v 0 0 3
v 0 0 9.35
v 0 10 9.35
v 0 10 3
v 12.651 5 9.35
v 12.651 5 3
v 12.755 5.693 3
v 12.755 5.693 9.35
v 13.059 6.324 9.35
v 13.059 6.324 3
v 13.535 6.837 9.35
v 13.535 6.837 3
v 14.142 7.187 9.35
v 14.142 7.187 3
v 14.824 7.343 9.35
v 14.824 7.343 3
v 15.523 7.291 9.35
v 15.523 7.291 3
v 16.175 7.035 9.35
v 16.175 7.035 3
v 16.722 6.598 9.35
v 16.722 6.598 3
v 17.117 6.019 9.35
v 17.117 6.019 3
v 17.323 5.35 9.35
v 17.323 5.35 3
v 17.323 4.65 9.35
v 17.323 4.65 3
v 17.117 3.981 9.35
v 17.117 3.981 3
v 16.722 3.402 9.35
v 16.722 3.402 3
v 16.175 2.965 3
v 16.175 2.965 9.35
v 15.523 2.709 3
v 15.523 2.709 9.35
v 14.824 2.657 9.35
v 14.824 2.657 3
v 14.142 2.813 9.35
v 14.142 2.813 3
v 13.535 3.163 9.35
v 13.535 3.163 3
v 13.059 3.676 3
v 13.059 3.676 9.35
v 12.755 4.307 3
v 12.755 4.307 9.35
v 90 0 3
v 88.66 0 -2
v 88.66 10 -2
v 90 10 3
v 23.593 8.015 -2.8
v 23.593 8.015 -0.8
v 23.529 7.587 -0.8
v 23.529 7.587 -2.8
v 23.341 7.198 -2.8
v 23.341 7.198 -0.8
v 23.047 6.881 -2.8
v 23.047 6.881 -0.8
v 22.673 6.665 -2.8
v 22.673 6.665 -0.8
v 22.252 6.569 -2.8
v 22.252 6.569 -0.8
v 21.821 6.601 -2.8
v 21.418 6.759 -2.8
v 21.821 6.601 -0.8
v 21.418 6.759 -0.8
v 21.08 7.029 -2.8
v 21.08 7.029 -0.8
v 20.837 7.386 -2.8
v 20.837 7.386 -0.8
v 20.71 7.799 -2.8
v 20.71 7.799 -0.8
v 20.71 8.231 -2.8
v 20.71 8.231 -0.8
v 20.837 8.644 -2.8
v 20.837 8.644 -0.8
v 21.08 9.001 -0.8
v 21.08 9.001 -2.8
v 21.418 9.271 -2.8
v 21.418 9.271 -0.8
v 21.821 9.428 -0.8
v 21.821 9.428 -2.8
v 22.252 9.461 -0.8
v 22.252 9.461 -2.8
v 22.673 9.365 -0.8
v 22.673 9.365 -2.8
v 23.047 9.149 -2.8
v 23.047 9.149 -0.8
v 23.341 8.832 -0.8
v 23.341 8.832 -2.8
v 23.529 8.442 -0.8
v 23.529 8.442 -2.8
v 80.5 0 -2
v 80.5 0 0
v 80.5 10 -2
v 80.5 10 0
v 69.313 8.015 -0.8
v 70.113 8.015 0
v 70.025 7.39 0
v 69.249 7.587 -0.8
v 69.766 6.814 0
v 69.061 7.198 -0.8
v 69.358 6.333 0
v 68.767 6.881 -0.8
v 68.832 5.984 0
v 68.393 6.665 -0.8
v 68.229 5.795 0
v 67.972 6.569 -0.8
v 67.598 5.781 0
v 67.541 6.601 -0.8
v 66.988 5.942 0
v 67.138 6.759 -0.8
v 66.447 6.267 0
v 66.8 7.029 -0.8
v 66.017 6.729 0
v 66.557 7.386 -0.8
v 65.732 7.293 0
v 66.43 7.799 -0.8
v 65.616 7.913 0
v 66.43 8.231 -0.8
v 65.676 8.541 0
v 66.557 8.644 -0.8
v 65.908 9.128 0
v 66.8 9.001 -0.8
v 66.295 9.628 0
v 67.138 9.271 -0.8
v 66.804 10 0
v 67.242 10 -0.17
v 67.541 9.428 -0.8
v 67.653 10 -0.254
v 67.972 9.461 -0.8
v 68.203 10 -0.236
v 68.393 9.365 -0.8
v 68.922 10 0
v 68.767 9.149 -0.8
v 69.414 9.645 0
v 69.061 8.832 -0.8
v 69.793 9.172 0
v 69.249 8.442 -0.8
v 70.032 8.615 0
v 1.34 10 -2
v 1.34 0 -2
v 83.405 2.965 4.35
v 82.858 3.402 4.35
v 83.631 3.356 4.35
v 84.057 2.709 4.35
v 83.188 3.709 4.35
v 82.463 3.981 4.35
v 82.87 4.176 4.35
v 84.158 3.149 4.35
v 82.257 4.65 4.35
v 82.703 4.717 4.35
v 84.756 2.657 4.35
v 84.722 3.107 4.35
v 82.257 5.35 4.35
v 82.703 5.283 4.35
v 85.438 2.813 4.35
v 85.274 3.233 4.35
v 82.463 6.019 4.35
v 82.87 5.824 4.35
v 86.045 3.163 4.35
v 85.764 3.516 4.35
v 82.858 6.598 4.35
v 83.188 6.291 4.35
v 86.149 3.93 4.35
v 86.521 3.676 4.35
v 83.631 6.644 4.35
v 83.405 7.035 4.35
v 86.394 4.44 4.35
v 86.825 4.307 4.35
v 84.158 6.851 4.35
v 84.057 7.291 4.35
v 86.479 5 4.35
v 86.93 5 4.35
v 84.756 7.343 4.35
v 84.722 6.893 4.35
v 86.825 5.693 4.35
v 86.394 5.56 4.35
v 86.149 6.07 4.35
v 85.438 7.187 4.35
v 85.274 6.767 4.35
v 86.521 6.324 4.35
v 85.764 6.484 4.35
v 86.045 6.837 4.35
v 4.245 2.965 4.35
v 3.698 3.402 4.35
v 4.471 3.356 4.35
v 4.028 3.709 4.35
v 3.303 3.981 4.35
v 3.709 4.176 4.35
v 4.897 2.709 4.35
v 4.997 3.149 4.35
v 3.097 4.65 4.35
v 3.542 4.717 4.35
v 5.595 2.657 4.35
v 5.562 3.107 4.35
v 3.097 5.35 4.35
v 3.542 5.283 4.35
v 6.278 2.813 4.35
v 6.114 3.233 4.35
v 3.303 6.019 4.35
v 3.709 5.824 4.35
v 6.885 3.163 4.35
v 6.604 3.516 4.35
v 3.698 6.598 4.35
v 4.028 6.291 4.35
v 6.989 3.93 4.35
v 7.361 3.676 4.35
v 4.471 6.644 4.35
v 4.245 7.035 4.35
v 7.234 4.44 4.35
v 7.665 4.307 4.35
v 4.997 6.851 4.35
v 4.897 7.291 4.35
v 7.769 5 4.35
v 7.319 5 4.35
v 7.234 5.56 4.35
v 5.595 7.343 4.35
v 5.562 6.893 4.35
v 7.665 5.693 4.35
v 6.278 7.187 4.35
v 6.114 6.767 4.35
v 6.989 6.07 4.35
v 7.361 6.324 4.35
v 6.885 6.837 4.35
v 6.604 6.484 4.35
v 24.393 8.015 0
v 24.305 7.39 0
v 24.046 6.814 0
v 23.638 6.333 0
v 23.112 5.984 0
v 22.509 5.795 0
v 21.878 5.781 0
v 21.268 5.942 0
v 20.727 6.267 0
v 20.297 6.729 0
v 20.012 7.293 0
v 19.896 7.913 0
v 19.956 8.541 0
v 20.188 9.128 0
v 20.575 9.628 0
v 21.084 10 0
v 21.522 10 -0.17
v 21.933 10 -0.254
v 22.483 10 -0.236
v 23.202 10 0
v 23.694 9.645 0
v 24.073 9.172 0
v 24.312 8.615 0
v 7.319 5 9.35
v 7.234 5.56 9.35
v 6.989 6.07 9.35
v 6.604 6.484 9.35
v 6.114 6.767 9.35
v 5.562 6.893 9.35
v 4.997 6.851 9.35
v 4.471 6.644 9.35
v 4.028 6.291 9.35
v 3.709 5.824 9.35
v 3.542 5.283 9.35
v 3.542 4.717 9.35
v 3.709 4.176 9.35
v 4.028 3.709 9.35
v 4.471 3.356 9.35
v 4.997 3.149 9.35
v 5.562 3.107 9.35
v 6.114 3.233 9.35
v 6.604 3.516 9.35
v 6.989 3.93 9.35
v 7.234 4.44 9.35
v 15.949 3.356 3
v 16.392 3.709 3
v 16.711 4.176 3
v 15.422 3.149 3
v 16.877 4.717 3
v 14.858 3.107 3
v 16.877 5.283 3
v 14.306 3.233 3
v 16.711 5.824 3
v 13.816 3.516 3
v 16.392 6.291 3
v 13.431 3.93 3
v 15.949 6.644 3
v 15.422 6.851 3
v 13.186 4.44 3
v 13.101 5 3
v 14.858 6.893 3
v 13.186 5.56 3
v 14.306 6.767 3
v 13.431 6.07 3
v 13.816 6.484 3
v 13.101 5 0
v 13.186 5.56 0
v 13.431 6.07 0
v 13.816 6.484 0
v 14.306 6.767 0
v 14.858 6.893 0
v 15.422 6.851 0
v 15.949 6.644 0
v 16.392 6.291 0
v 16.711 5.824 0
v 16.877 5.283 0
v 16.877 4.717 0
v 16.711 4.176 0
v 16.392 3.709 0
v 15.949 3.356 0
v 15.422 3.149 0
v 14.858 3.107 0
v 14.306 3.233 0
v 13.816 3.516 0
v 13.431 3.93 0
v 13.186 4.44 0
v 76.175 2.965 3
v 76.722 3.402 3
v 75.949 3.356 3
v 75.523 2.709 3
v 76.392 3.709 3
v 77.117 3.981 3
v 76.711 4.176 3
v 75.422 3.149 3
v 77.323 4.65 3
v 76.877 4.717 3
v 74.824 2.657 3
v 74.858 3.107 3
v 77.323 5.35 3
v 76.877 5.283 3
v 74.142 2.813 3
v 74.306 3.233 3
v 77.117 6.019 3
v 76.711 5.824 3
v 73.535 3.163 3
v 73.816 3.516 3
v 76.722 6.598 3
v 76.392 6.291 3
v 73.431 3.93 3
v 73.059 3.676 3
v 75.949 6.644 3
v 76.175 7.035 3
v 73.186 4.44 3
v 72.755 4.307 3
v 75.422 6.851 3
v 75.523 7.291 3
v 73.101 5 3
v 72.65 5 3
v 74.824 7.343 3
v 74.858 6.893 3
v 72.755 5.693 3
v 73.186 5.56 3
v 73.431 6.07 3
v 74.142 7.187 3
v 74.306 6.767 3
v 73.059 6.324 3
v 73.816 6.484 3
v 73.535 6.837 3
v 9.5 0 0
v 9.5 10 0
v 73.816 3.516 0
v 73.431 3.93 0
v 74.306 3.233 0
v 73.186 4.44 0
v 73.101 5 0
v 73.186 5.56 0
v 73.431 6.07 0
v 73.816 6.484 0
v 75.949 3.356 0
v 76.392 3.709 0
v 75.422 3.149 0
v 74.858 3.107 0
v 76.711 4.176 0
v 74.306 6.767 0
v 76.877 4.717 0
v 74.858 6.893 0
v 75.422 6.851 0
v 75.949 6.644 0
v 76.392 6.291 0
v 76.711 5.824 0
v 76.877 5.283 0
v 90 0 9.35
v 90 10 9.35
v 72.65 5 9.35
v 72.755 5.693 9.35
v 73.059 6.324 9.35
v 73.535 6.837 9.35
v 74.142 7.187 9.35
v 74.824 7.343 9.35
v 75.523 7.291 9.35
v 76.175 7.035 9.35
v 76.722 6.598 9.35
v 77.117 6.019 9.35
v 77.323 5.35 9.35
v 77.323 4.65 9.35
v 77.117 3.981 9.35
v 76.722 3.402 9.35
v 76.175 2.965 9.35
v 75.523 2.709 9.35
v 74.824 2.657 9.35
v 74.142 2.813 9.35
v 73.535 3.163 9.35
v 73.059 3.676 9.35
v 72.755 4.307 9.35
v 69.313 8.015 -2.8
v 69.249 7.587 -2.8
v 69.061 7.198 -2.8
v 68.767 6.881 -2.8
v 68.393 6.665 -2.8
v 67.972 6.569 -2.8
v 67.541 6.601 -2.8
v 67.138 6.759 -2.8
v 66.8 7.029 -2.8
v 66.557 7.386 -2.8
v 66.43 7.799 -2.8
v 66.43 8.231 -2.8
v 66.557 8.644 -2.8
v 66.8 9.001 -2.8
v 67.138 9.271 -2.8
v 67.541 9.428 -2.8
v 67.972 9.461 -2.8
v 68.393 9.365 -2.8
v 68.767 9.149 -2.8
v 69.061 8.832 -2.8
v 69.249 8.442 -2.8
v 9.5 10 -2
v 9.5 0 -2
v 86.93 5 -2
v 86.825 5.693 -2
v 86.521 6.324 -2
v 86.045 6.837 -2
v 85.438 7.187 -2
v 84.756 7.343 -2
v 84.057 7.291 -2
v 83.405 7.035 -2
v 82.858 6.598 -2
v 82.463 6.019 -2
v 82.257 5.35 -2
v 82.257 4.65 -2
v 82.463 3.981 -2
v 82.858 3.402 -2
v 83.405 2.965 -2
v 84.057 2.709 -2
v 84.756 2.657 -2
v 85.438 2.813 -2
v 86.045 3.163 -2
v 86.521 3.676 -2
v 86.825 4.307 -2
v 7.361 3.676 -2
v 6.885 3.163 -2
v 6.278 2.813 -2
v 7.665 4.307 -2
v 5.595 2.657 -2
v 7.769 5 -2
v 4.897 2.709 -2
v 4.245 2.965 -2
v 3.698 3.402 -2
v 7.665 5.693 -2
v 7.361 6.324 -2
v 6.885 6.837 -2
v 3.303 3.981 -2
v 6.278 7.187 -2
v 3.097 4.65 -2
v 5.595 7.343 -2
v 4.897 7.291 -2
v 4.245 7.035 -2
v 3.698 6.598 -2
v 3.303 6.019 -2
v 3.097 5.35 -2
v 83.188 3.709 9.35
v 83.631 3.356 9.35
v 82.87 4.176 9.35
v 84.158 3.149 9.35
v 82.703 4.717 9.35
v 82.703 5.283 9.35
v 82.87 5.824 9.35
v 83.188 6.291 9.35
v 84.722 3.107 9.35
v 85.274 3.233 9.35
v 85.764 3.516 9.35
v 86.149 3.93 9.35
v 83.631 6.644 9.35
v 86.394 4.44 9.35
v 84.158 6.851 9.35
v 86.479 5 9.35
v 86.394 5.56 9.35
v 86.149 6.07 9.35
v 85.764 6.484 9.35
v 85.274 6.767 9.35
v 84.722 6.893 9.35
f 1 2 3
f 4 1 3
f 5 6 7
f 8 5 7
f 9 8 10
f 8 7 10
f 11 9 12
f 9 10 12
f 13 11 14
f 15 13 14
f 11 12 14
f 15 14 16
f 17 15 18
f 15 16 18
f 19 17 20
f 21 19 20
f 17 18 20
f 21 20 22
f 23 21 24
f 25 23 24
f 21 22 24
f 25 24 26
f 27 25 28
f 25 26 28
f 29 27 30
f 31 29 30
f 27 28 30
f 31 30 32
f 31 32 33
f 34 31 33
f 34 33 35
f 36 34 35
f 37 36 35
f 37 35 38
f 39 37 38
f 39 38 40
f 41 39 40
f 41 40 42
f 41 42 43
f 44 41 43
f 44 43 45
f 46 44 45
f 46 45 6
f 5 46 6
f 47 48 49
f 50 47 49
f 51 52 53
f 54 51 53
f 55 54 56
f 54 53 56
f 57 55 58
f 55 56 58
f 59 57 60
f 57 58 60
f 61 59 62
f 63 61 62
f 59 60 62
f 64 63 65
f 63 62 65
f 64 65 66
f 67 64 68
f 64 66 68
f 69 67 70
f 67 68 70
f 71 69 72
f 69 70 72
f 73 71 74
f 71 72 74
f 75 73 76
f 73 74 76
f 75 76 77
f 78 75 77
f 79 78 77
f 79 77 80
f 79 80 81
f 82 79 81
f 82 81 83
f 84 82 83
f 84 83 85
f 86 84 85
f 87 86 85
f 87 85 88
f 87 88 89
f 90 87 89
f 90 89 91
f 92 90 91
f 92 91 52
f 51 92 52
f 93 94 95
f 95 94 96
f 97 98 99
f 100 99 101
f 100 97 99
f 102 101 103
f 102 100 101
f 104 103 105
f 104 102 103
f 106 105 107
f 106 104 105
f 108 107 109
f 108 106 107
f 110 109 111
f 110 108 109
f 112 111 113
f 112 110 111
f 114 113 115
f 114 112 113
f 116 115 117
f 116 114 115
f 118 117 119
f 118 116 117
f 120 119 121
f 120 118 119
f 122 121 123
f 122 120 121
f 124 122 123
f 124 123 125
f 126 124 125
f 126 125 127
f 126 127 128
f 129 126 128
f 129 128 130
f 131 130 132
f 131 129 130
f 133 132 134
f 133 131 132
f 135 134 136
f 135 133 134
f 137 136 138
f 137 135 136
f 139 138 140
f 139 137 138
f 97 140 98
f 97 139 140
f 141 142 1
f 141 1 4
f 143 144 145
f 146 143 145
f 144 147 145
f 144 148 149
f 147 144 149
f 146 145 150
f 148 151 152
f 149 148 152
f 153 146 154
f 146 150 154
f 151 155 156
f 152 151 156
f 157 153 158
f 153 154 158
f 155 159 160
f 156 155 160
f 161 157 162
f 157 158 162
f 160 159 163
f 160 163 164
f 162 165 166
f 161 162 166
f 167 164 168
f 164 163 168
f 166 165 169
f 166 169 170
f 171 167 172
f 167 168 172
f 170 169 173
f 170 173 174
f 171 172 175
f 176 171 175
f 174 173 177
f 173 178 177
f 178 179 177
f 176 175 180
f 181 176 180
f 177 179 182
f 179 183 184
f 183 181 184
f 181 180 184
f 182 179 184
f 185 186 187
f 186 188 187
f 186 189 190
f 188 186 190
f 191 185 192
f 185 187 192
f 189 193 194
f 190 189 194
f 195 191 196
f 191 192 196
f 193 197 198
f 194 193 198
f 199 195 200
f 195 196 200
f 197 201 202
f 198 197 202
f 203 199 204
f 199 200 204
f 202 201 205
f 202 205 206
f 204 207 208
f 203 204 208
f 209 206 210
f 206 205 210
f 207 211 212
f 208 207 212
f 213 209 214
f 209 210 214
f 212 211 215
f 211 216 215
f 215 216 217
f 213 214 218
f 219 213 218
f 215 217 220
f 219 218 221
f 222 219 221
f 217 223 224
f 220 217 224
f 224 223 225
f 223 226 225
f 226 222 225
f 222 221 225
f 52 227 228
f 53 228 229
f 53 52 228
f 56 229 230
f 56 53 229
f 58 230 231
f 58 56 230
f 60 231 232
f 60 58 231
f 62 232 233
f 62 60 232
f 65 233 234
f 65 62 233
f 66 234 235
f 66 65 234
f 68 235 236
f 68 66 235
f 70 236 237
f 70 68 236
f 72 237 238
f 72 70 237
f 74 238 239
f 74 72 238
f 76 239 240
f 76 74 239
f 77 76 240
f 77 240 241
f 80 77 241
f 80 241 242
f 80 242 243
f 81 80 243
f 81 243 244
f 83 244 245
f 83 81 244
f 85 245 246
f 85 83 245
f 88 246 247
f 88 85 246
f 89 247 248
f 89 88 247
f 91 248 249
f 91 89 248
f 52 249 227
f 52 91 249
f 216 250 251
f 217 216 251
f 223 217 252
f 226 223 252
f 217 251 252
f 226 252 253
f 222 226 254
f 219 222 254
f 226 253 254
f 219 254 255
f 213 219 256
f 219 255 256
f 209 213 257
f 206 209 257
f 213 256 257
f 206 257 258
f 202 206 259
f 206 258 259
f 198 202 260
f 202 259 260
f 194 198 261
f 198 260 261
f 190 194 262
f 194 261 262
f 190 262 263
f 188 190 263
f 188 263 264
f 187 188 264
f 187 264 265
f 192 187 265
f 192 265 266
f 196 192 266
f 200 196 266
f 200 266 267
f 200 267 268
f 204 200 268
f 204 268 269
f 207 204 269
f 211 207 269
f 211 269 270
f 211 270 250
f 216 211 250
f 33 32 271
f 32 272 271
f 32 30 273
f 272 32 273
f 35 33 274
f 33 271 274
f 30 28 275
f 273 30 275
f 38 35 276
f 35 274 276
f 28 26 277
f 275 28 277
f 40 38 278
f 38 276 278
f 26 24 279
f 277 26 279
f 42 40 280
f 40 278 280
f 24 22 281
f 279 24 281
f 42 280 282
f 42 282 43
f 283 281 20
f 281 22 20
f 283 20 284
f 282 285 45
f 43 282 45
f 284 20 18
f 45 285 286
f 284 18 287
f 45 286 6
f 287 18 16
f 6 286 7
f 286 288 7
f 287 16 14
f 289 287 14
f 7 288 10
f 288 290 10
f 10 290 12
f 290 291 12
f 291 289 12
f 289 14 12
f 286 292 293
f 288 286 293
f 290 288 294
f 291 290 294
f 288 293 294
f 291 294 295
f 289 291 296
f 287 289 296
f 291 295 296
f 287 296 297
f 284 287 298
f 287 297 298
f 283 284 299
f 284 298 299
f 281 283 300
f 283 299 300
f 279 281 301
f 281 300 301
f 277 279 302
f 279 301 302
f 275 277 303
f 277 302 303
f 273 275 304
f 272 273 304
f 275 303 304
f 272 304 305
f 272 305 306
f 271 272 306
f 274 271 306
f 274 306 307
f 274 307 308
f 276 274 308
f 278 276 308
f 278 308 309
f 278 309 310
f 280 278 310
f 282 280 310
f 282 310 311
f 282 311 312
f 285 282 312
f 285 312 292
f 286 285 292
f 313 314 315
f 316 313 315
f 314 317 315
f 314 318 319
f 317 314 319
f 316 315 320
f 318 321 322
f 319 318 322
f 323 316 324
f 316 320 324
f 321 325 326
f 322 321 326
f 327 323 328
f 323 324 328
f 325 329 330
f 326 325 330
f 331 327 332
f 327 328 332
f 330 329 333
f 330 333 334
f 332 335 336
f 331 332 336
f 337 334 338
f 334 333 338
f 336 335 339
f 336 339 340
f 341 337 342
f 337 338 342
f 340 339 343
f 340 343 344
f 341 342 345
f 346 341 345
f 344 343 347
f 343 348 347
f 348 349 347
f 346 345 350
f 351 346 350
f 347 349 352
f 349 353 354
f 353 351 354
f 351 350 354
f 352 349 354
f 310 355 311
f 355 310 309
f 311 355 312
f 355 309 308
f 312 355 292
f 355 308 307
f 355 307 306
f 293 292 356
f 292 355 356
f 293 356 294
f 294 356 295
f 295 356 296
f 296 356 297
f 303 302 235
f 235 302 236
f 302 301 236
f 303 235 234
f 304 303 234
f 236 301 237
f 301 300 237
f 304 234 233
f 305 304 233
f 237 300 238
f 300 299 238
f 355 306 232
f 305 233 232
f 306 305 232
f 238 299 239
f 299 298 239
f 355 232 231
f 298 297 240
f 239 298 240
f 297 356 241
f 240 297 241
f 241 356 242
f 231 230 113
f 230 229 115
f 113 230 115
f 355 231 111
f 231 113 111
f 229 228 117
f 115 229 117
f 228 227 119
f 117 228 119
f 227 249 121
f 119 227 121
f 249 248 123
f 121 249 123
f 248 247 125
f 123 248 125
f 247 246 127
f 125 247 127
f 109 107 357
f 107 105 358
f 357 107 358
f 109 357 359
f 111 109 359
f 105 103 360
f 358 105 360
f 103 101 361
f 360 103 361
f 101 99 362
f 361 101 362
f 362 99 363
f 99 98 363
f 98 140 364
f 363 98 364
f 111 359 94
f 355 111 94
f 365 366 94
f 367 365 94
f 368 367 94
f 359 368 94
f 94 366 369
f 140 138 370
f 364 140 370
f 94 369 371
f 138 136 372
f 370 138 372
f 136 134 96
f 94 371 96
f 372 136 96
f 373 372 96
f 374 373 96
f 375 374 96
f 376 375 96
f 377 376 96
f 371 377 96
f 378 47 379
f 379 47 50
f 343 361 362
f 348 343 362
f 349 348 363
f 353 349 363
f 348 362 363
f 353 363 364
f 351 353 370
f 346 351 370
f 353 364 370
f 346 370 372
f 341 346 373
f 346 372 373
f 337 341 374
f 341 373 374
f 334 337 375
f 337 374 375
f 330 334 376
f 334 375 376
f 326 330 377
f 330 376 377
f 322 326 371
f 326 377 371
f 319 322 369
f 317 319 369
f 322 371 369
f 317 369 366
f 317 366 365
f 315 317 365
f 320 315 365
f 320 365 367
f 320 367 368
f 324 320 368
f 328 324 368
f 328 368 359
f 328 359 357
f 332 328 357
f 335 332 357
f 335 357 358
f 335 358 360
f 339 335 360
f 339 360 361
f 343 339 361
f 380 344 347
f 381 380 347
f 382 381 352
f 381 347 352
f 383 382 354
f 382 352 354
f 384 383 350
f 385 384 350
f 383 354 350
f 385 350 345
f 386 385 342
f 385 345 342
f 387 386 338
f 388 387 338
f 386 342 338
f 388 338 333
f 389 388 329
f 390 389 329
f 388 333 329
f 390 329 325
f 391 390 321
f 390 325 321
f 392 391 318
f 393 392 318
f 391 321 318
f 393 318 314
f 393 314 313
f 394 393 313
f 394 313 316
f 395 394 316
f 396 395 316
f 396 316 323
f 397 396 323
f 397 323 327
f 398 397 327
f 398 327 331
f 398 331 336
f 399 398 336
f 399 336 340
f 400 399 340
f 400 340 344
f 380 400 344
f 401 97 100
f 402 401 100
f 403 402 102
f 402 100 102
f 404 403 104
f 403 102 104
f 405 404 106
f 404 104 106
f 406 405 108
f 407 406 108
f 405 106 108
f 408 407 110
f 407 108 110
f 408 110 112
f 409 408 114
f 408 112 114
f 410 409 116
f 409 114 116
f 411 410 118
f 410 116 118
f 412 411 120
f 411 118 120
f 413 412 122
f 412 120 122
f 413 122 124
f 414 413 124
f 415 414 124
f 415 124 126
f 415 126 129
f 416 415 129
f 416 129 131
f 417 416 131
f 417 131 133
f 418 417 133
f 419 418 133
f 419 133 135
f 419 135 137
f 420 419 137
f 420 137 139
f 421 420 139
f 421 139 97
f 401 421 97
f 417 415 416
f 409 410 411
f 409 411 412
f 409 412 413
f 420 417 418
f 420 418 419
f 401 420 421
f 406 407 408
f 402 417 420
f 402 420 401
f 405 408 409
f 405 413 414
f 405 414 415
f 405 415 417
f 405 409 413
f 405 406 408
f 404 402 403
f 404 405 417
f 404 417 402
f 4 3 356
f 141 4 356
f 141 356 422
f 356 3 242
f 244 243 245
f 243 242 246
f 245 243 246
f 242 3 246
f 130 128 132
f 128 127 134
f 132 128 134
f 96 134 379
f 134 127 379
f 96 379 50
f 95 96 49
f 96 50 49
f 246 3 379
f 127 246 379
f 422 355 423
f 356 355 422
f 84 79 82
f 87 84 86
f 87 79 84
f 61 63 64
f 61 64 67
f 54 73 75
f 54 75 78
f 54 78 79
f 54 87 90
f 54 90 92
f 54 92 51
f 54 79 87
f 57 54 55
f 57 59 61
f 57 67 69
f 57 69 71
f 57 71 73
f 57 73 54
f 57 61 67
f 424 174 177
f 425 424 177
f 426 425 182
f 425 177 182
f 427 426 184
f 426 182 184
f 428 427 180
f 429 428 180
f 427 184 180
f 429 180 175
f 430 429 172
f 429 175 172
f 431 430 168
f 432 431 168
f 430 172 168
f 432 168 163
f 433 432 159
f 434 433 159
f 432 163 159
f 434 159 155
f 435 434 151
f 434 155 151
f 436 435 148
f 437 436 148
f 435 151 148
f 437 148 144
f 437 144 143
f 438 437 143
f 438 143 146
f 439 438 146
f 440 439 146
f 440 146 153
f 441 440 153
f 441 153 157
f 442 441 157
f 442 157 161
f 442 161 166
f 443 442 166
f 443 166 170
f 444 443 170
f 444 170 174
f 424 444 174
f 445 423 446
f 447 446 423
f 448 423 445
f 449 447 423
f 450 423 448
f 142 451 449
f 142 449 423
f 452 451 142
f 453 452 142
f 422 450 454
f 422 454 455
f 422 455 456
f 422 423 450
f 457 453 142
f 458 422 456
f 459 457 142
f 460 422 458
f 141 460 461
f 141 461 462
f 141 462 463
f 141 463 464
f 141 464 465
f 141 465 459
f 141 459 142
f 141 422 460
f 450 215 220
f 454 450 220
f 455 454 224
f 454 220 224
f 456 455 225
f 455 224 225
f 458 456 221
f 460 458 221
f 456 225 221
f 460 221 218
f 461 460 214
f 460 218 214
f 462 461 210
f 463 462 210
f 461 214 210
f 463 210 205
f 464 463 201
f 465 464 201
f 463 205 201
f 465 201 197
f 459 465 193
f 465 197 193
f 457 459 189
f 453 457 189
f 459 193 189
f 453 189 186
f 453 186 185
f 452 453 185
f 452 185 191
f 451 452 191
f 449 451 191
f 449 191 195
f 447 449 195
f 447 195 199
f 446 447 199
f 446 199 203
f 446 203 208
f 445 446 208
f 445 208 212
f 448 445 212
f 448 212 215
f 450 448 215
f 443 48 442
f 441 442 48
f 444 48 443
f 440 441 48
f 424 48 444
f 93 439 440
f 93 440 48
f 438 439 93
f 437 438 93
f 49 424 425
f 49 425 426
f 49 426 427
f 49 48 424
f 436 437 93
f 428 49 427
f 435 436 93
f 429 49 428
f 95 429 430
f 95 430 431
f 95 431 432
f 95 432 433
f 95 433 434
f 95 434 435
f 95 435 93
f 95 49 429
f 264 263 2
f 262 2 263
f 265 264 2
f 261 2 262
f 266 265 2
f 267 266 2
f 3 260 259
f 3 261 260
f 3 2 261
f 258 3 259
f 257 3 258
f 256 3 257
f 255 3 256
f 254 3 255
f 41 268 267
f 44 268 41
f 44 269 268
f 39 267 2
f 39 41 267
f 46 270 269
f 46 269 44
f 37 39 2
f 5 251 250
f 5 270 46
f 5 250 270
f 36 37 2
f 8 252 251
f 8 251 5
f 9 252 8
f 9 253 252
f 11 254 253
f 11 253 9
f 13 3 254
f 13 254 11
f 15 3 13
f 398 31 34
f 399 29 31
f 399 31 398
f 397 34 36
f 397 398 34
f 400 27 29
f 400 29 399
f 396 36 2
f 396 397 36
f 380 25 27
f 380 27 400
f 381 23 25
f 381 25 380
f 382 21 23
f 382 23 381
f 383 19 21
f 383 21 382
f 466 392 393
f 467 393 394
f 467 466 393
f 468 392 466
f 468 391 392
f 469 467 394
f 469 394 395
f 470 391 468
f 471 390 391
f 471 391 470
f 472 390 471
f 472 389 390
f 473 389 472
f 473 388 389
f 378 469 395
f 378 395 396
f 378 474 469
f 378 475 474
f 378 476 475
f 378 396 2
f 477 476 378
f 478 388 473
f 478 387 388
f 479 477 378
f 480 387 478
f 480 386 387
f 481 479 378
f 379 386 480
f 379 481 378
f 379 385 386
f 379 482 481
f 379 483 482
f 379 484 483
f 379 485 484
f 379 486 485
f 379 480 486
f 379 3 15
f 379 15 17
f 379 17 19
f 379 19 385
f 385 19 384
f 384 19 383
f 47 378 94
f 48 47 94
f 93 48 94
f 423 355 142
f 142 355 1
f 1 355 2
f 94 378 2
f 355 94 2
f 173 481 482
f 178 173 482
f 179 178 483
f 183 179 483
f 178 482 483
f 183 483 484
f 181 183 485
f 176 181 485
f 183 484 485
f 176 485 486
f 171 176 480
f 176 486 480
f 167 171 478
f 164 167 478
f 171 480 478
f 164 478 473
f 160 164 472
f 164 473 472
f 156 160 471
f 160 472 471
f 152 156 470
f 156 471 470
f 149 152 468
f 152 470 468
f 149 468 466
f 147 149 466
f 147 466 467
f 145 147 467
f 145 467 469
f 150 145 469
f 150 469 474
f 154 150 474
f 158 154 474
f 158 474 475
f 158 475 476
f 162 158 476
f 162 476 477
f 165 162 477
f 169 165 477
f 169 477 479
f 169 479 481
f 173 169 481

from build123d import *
from OCP.BRepFilletAPI import BRepFilletAPI_MakeChamfer

# Parameters (mm, degrees)
SKETCH2_W                       = 90
SKETCH2_H                       = 10
BOSS_EXTRUDE1_DEPTH             = 9.35
SKETCH4_W                       = 9.5
SKETCH4_H                       = 10
BOSS_EXTRUDE2_DEPTH             = 2
SKETCH5_R                       = 1.45
BOSS_EXTRUDE3_DEPTH             = 2.8
CHAMFER1_SIZE                   = 0.8
CHAMFER2_SIZE                   = 5
CHAMFER2_SIZE2                  = 1.339745962
F_13_0_185_DIAMETER_HOLE1_D     = 4.699
F_13_0_185_DIAMETER_HOLE1_DEPTH = 6.35
F_6_CLEARANCE_HOLE1_D           = 3.7973
F_6_CLEARANCE_HOLE1_ON_FACE_2_D = 3.7973
F_13_0_185_DIAMETER_HOLE2_D     = 4.699
F_13_0_185_DIAMETER_HOLE2_DEPTH = 6.35
F_6_CLEARANCE_HOLE2_D           = 3.7973


with BuildPart() as part:
    # Sketch2 → Boss-Extrude1 (new body)
    with BuildSketch(Plane.XY):
        with Locations((45, 5)):
            Rectangle(SKETCH2_W, SKETCH2_H)
    extrude(amount=BOSS_EXTRUDE1_DEPTH)

    # Sketch4 → Boss-Extrude2 (add)
    with BuildSketch(Plane(origin=(0, 0, 0), x_dir=(-1, 0, 0), z_dir=(0, 0, -1))):
        with Locations((-4.75, 5)):
            Rectangle(SKETCH4_W, SKETCH4_H)
        with Locations((-85.25, 5)):
            Rectangle(SKETCH4_W, SKETCH4_H)
    extrude(amount=BOSS_EXTRUDE2_DEPTH)

    # Sketch5 → Boss-Extrude3 (add)
    with BuildSketch(Plane(origin=(0, 0, 0), x_dir=(-1, 0, 0), z_dir=(0, 0, -1))):
        with Locations(Location((-67.863406388, 8.0148451, 0), (0, 0, 180))):
            Circle(SKETCH5_R)
        with Locations(Location((-22.143406388, 8.0148451, 0), (0, 0, 180))):
            Circle(SKETCH5_R)
    extrude(amount=BOSS_EXTRUDE3_DEPTH)

    # Chamfer1
    # the kernel refuses this chamfer: 0.8 mm, written as the material it adds along each edge
    with BuildSketch(Plane(origin=(67.863406388, 8.0148451, 0), x_dir=(1, 0, 0), z_dir=(0, 1, 0))) as chamfer1_piece_1_section:
        Polygon((1.45 + CHAMFER1_SIZE, 0), (1.45, CHAMFER1_SIZE), (1.45, 0), align=None)
    chamfer1_piece_1 = revolve(axis=Axis((67.863406388, 8.0148451, 0), (0, 0, -1)), mode=Mode.PRIVATE)
    chamfer1_piece_1 = split(chamfer1_piece_1, bisect_by=Plane(origin=(66.024382204, 10, -0.389024184), z_dir=(0, -1, 0)), keep=Keep.TOP, mode=Mode.PRIVATE)
    add(chamfer1_piece_1)
    with BuildSketch(Plane(origin=(22.143406388, 8.0148451, 0), x_dir=(1, 0, 0), z_dir=(0, 1, 0))) as chamfer1_piece_2_section:
        Polygon((1.45 + CHAMFER1_SIZE, 0), (1.45, CHAMFER1_SIZE), (1.45, 0), align=None)
    chamfer1_piece_2 = revolve(axis=Axis((22.143406388, 8.0148451, 0), (0, 0, -1)), mode=Mode.PRIVATE)
    chamfer1_piece_2 = split(chamfer1_piece_2, bisect_by=Plane(origin=(20.304382204, 10, -0.389024184), z_dir=(0, -1, 0)), keep=Keep.TOP, mode=Mode.PRIVATE)
    add(chamfer1_piece_2)

    # Chamfer2: one chamfer whose edges measure the first distance from different faces: ONE call of the kernel's chamfer builder (chamfer() names one face for all edges)
    chamfer2_edges_1 = [part.edges().sort_by_distance(p)[0] for p in [
        (0, 5, -2),
    ]]
    chamfer2_side_1 = [part.faces().sort_by_distance(p)[0] for p in [
        (0, 5, 3.675),
    ]]
    chamfer2_edges_2 = [part.edges().sort_by_distance(p)[0] for p in [
        (90, 5, -2),
    ]]
    chamfer2_side_2 = [part.faces().sort_by_distance(p)[0] for p in [
        (90, 5, 3.675),
    ]]
    chamfer2 = BRepFilletAPI_MakeChamfer(part.part.solid().wrapped)
    for e in chamfer2_edges_1:
        chamfer2.Add(CHAMFER2_SIZE, CHAMFER2_SIZE2, e.wrapped, chamfer2_side_1[0].wrapped)  # the first distance lies on this face
    for e in chamfer2_edges_2:
        chamfer2.Add(CHAMFER2_SIZE, CHAMFER2_SIZE2, e.wrapped, chamfer2_side_2[0].wrapped)  # the first distance lies on this face
    add(Compound.cast(chamfer2.Shape()), mode=Mode.REPLACE)

    # #13 (0.185) Diameter Hole1
    with Locations(Plane(origin=(84.580127019, 5, -2), x_dir=(-1, 0, 0), z_dir=(0, 0, -1))):
        with Locations((0, 0), (79.160254038, 0)):
            Hole(F_13_0_185_DIAMETER_HOLE1_D / 2, depth=F_13_0_185_DIAMETER_HOLE1_DEPTH)

    # #6 Clearance Hole1 (through all)
    with Locations(Plane(origin=(84.580127019, 5, 4.35), x_dir=(-1, 0, 0), z_dir=(0, 0, -1))):
        with Locations((0, 0), (79.160254038, 0)):
            Hole(F_6_CLEARANCE_HOLE1_D / 2)

    # #6 Clearance Hole1 on face 2 (through all)
    with Locations(Plane(origin=(5.419872981, 5, 0), x_dir=(-1, 0, 0), z_dir=(0, 0, -1))):
        with Locations((0, 0)):
            Hole(F_6_CLEARANCE_HOLE1_ON_FACE_2_D / 2)

    # #13 (0.185) Diameter Hole2
    with Locations(Plane(origin=(75, 5, 9.35), x_dir=(1, 0, 0), z_dir=(0, 0, 1))):
        with Locations((0, 0), (-60, 0)):
            Hole(F_13_0_185_DIAMETER_HOLE2_D / 2, depth=F_13_0_185_DIAMETER_HOLE2_DEPTH)

    # #6 Clearance Hole2 (through all)
    with Locations(Plane(origin=(75, 5, 3), x_dir=(1, 0, 0), z_dir=(0, 0, 1))):
        with Locations((0, 0), (-60, 0)):
            Hole(F_6_CLEARANCE_HOLE2_D / 2)


solid = part.part
